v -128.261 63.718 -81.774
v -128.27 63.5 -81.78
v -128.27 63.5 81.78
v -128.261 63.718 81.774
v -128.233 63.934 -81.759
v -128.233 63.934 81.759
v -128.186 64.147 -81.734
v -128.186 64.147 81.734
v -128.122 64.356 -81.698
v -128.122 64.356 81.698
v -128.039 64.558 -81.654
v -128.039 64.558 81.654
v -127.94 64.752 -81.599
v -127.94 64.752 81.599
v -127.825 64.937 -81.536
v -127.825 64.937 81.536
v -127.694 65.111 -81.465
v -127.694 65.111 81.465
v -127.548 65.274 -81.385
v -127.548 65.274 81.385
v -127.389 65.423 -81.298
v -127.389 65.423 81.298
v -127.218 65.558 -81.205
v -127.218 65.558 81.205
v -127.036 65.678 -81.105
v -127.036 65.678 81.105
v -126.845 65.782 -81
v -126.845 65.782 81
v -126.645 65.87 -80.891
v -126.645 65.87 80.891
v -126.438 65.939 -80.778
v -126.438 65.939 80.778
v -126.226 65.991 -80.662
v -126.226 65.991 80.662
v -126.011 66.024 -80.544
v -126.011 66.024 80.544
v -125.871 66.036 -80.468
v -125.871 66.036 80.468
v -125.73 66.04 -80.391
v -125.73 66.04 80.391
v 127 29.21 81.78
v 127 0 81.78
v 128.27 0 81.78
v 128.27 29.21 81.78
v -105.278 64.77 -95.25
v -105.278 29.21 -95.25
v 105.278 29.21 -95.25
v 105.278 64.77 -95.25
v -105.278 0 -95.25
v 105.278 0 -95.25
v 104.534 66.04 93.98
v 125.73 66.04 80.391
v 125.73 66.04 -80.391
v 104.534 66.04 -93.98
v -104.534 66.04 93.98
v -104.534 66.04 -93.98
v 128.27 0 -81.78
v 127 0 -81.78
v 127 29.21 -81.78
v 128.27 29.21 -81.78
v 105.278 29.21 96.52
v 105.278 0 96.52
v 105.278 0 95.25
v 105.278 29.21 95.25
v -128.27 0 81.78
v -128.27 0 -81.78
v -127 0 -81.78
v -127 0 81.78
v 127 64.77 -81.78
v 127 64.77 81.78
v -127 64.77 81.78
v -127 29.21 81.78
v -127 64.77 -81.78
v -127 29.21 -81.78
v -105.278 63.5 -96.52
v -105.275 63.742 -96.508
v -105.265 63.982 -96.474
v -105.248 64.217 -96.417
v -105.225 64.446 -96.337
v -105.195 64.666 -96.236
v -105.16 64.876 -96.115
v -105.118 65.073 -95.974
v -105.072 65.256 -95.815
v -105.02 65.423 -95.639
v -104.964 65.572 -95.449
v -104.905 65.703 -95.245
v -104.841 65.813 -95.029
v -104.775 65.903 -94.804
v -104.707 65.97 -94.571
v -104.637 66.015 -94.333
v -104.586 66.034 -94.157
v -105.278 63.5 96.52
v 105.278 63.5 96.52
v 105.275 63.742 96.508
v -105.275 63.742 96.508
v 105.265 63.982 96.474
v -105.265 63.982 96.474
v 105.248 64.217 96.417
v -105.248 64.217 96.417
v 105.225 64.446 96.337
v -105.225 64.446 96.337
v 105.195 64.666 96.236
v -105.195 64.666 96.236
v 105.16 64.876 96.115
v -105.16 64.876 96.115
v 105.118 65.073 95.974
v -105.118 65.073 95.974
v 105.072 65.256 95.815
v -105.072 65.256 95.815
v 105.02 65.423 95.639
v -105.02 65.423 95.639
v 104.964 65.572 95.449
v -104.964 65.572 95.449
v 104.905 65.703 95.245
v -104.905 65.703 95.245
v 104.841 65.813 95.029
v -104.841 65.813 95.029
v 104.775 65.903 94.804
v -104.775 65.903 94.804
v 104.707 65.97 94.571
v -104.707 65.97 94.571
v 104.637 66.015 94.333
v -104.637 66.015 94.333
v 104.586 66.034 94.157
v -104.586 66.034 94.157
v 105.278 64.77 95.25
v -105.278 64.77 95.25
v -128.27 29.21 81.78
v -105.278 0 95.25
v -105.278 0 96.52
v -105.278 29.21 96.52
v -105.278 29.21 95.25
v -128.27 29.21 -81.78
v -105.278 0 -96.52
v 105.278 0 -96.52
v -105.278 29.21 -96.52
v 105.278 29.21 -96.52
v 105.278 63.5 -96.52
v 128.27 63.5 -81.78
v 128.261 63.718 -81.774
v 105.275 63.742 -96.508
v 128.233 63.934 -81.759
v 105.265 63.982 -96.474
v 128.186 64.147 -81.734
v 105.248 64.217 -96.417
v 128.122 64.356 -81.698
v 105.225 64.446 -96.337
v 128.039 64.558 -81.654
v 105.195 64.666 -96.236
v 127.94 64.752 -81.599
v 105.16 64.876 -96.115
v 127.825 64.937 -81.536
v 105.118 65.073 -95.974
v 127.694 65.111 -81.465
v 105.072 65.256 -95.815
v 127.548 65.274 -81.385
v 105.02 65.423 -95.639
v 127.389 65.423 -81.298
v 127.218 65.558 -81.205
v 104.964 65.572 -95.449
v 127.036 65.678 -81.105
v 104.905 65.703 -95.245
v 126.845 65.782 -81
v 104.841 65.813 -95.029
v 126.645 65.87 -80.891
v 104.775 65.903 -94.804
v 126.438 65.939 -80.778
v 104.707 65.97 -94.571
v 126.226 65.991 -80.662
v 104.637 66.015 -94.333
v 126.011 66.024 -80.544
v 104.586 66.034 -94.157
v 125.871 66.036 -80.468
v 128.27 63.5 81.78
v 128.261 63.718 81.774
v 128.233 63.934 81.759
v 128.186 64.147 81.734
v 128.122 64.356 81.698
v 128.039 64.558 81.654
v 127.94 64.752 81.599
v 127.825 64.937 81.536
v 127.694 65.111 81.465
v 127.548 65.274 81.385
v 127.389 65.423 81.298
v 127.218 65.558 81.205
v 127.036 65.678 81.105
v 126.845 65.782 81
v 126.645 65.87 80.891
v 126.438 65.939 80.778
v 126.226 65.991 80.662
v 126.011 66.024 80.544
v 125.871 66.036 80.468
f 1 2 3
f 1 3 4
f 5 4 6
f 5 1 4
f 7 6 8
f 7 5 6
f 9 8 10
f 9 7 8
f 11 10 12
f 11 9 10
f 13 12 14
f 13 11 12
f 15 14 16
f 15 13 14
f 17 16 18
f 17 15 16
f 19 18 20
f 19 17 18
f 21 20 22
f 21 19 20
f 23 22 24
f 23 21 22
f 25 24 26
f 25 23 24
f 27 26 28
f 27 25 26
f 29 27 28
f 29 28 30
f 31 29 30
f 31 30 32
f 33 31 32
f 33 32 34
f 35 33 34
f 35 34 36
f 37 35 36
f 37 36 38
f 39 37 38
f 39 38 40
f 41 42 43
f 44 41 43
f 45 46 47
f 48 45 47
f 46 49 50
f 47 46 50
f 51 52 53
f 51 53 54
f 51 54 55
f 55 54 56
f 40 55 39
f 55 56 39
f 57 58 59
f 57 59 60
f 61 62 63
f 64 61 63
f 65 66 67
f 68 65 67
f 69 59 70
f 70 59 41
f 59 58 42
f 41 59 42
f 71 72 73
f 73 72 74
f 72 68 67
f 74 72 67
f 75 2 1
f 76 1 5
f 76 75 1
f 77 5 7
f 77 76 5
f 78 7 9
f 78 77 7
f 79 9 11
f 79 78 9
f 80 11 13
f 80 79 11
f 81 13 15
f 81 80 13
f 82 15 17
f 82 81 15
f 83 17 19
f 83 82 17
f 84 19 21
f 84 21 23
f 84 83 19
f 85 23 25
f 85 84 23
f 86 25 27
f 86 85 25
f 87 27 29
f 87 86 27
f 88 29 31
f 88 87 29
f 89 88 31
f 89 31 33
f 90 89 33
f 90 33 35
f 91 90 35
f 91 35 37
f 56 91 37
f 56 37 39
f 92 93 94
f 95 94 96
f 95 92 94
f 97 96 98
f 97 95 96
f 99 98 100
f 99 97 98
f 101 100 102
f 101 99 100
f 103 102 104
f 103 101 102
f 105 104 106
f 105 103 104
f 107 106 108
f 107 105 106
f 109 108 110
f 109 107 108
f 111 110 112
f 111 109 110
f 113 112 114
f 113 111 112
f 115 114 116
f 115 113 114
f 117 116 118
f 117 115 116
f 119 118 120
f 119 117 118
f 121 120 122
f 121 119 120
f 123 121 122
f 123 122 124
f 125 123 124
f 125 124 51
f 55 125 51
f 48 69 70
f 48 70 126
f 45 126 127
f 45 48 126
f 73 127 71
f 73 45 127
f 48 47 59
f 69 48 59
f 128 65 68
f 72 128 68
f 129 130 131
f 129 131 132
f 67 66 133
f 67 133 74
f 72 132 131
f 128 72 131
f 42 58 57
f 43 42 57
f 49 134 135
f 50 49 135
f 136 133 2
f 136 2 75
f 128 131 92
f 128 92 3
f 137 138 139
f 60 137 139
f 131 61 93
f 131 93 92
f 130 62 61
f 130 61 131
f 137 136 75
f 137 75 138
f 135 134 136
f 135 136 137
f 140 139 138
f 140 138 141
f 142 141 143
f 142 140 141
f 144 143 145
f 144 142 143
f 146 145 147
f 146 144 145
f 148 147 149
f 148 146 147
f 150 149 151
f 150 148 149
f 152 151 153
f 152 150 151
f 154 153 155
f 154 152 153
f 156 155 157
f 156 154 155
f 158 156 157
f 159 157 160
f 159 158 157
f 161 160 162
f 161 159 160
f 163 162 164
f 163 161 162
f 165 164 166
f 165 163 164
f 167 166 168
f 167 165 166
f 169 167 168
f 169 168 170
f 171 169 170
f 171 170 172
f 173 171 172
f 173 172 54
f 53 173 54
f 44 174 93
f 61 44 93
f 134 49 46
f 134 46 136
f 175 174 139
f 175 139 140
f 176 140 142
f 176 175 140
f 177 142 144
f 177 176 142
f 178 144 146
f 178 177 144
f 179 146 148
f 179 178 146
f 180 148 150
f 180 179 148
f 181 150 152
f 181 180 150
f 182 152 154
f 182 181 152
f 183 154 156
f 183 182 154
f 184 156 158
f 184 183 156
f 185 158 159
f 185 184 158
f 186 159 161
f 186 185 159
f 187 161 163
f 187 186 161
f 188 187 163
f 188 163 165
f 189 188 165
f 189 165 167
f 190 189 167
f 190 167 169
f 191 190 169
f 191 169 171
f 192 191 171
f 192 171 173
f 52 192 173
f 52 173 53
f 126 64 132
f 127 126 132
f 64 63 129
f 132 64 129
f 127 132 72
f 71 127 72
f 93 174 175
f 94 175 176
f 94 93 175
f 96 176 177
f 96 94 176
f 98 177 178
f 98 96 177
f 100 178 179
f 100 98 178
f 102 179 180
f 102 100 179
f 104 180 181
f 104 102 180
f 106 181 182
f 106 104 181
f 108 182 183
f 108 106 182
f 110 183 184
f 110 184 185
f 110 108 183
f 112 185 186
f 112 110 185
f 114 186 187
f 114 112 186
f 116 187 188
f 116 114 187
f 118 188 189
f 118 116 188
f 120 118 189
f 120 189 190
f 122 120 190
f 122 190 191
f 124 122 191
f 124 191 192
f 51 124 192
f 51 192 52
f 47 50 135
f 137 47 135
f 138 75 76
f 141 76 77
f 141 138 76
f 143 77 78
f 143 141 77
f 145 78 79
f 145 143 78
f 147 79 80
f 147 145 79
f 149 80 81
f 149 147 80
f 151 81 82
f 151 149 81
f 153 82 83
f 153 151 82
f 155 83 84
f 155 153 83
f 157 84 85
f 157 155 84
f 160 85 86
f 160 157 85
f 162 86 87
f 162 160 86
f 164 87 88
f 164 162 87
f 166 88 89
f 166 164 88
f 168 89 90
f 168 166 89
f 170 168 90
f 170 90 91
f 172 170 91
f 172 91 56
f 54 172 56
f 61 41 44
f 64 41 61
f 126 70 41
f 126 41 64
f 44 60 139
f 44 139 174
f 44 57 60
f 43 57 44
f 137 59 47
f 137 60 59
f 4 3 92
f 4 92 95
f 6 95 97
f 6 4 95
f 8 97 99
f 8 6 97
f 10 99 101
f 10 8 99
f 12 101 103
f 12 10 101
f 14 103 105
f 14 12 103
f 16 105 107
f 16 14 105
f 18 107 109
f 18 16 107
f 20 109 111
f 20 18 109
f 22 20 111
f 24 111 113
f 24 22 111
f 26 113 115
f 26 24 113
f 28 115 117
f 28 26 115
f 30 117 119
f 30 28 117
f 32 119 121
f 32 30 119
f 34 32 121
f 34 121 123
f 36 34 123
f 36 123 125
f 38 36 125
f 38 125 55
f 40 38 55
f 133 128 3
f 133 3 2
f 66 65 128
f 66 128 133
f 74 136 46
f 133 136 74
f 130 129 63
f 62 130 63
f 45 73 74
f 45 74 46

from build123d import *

# Parameters (mm, degrees)
SKETCH1_W             = 210.556721652
SKETCH1_H             = 1.27
BOSS_EXTRUDE1_DEPTH   = 29.21
SKETCH1_W_2           = 1.27
SKETCH1_H_2           = 163.559236
BOSS_EXTRUDE1_2_DEPTH = 29.21
BOSS_EXTRUDE1_3_DEPTH = 29.21
BOSS_EXTRUDE1_4_DEPTH = 29.21
BOSS_EXTRUDE2_DEPTH   = 35.56
BOSS_EXTRUDE3_DEPTH   = 1.27
FILLET1_R             = 2.54


with BuildPart() as part:
    # Sketch1 → Boss-Extrude1 (new body)
    with BuildSketch(Plane(origin=(0, 0, 0), x_dir=(1, 0, 0), z_dir=(0, 1, 0))):
        with Locations((0, -95.885)):
            Rectangle(SKETCH1_W, SKETCH1_H)
    extrude(amount=BOSS_EXTRUDE1_DEPTH)



with BuildPart() as body_2:
    # Sketch1 → Boss-Extrude1 2 (new body)
    with BuildSketch(Plane(origin=(0, 0, 0), x_dir=(1, 0, 0), z_dir=(0, 1, 0))):
        with Locations((-127.635, 0)):
            Rectangle(SKETCH1_W_2, SKETCH1_H_2)
    extrude(amount=BOSS_EXTRUDE1_2_DEPTH)


with BuildPart() as body_3:
    # Sketch1 → Boss-Extrude1 3 (new body)
    with BuildSketch(Plane(origin=(0, 0, 0), x_dir=(1, 0, 0), z_dir=(0, 1, 0))):
        with Locations((0, 95.885)):
            Rectangle(SKETCH1_W, SKETCH1_H)
    extrude(amount=BOSS_EXTRUDE1_3_DEPTH)


with BuildPart() as body_4:
    # Sketch1 → Boss-Extrude1 4 (new body)
    with BuildSketch(Plane(origin=(0, 0, 0), x_dir=(1, 0, 0), z_dir=(0, 1, 0))):
        with Locations((127.635, 0)):
            Rectangle(SKETCH1_W_2, SKETCH1_H_2)
    extrude(amount=BOSS_EXTRUDE1_4_DEPTH)


with BuildPart() as part_1:
    add(part.part)

    add(body_2.part)  # Boss-Extrude2 merges body 2

    add(body_3.part)  # Boss-Extrude2 merges body 3

    add(body_4.part)  # Boss-Extrude2 merges body 4
    # Sketch4 → Boss-Extrude2 (add)
    with BuildSketch(Plane(origin=(0, 29.21, 0), x_dir=(1, 0, 0), z_dir=(0, 1, 0))):
        Polygon((-128.27, 81.779618), (-105.278360826, 96.52), (105.278360826, 96.52), (128.27, 81.779618), (128.27, -81.779618), (105.278360826, -96.52), (-105.278360826, -96.52), (-128.27, -81.779618), align=None)
        Polygon((-127, 81.779618), (-105.278360826, 95.25), (105.278360826, 95.25), (127, 81.779618), (127, -81.779618), (105.278360826, -95.25), (-105.278360826, -95.25), (-127, -81.779618), align=None, mode=Mode.SUBTRACT)
    extrude(amount=BOSS_EXTRUDE2_DEPTH)

    # Sketch5 → Boss-Extrude3 (add)
    with BuildSketch(Plane(origin=(0, 64.77, 0), x_dir=(1, 0, 0), z_dir=(0, 1, 0))):
        Polygon((-128.27, 81.779618), (-105.278360826, 96.52), (105.278360826, 96.52), (128.27, 81.779618), (128.27, -81.779618), (105.278360826, -96.52), (-105.278360826, -96.52), (-128.27, -81.779618), align=None)
    extrude(amount=BOSS_EXTRUDE3_DEPTH)

    # Fillet1
    fillet1_edges = [part_1.edges().sort_by_distance(p)[0] for p in [
        (-128.27, 66.04, 0),
        (-116.774180413, 66.04, 89.149809),
        (0, 66.04, 96.52),
        (116.774180413, 66.04, 89.149809),
        (128.27, 66.04, 0),
        (116.774180413, 66.04, -89.149809),
        (0, 66.04, -96.52),
        (-116.774180413, 66.04, -89.149809),
    ]]
    fillet(fillet1_edges, radius=FILLET1_R)


solid = part_1.part
